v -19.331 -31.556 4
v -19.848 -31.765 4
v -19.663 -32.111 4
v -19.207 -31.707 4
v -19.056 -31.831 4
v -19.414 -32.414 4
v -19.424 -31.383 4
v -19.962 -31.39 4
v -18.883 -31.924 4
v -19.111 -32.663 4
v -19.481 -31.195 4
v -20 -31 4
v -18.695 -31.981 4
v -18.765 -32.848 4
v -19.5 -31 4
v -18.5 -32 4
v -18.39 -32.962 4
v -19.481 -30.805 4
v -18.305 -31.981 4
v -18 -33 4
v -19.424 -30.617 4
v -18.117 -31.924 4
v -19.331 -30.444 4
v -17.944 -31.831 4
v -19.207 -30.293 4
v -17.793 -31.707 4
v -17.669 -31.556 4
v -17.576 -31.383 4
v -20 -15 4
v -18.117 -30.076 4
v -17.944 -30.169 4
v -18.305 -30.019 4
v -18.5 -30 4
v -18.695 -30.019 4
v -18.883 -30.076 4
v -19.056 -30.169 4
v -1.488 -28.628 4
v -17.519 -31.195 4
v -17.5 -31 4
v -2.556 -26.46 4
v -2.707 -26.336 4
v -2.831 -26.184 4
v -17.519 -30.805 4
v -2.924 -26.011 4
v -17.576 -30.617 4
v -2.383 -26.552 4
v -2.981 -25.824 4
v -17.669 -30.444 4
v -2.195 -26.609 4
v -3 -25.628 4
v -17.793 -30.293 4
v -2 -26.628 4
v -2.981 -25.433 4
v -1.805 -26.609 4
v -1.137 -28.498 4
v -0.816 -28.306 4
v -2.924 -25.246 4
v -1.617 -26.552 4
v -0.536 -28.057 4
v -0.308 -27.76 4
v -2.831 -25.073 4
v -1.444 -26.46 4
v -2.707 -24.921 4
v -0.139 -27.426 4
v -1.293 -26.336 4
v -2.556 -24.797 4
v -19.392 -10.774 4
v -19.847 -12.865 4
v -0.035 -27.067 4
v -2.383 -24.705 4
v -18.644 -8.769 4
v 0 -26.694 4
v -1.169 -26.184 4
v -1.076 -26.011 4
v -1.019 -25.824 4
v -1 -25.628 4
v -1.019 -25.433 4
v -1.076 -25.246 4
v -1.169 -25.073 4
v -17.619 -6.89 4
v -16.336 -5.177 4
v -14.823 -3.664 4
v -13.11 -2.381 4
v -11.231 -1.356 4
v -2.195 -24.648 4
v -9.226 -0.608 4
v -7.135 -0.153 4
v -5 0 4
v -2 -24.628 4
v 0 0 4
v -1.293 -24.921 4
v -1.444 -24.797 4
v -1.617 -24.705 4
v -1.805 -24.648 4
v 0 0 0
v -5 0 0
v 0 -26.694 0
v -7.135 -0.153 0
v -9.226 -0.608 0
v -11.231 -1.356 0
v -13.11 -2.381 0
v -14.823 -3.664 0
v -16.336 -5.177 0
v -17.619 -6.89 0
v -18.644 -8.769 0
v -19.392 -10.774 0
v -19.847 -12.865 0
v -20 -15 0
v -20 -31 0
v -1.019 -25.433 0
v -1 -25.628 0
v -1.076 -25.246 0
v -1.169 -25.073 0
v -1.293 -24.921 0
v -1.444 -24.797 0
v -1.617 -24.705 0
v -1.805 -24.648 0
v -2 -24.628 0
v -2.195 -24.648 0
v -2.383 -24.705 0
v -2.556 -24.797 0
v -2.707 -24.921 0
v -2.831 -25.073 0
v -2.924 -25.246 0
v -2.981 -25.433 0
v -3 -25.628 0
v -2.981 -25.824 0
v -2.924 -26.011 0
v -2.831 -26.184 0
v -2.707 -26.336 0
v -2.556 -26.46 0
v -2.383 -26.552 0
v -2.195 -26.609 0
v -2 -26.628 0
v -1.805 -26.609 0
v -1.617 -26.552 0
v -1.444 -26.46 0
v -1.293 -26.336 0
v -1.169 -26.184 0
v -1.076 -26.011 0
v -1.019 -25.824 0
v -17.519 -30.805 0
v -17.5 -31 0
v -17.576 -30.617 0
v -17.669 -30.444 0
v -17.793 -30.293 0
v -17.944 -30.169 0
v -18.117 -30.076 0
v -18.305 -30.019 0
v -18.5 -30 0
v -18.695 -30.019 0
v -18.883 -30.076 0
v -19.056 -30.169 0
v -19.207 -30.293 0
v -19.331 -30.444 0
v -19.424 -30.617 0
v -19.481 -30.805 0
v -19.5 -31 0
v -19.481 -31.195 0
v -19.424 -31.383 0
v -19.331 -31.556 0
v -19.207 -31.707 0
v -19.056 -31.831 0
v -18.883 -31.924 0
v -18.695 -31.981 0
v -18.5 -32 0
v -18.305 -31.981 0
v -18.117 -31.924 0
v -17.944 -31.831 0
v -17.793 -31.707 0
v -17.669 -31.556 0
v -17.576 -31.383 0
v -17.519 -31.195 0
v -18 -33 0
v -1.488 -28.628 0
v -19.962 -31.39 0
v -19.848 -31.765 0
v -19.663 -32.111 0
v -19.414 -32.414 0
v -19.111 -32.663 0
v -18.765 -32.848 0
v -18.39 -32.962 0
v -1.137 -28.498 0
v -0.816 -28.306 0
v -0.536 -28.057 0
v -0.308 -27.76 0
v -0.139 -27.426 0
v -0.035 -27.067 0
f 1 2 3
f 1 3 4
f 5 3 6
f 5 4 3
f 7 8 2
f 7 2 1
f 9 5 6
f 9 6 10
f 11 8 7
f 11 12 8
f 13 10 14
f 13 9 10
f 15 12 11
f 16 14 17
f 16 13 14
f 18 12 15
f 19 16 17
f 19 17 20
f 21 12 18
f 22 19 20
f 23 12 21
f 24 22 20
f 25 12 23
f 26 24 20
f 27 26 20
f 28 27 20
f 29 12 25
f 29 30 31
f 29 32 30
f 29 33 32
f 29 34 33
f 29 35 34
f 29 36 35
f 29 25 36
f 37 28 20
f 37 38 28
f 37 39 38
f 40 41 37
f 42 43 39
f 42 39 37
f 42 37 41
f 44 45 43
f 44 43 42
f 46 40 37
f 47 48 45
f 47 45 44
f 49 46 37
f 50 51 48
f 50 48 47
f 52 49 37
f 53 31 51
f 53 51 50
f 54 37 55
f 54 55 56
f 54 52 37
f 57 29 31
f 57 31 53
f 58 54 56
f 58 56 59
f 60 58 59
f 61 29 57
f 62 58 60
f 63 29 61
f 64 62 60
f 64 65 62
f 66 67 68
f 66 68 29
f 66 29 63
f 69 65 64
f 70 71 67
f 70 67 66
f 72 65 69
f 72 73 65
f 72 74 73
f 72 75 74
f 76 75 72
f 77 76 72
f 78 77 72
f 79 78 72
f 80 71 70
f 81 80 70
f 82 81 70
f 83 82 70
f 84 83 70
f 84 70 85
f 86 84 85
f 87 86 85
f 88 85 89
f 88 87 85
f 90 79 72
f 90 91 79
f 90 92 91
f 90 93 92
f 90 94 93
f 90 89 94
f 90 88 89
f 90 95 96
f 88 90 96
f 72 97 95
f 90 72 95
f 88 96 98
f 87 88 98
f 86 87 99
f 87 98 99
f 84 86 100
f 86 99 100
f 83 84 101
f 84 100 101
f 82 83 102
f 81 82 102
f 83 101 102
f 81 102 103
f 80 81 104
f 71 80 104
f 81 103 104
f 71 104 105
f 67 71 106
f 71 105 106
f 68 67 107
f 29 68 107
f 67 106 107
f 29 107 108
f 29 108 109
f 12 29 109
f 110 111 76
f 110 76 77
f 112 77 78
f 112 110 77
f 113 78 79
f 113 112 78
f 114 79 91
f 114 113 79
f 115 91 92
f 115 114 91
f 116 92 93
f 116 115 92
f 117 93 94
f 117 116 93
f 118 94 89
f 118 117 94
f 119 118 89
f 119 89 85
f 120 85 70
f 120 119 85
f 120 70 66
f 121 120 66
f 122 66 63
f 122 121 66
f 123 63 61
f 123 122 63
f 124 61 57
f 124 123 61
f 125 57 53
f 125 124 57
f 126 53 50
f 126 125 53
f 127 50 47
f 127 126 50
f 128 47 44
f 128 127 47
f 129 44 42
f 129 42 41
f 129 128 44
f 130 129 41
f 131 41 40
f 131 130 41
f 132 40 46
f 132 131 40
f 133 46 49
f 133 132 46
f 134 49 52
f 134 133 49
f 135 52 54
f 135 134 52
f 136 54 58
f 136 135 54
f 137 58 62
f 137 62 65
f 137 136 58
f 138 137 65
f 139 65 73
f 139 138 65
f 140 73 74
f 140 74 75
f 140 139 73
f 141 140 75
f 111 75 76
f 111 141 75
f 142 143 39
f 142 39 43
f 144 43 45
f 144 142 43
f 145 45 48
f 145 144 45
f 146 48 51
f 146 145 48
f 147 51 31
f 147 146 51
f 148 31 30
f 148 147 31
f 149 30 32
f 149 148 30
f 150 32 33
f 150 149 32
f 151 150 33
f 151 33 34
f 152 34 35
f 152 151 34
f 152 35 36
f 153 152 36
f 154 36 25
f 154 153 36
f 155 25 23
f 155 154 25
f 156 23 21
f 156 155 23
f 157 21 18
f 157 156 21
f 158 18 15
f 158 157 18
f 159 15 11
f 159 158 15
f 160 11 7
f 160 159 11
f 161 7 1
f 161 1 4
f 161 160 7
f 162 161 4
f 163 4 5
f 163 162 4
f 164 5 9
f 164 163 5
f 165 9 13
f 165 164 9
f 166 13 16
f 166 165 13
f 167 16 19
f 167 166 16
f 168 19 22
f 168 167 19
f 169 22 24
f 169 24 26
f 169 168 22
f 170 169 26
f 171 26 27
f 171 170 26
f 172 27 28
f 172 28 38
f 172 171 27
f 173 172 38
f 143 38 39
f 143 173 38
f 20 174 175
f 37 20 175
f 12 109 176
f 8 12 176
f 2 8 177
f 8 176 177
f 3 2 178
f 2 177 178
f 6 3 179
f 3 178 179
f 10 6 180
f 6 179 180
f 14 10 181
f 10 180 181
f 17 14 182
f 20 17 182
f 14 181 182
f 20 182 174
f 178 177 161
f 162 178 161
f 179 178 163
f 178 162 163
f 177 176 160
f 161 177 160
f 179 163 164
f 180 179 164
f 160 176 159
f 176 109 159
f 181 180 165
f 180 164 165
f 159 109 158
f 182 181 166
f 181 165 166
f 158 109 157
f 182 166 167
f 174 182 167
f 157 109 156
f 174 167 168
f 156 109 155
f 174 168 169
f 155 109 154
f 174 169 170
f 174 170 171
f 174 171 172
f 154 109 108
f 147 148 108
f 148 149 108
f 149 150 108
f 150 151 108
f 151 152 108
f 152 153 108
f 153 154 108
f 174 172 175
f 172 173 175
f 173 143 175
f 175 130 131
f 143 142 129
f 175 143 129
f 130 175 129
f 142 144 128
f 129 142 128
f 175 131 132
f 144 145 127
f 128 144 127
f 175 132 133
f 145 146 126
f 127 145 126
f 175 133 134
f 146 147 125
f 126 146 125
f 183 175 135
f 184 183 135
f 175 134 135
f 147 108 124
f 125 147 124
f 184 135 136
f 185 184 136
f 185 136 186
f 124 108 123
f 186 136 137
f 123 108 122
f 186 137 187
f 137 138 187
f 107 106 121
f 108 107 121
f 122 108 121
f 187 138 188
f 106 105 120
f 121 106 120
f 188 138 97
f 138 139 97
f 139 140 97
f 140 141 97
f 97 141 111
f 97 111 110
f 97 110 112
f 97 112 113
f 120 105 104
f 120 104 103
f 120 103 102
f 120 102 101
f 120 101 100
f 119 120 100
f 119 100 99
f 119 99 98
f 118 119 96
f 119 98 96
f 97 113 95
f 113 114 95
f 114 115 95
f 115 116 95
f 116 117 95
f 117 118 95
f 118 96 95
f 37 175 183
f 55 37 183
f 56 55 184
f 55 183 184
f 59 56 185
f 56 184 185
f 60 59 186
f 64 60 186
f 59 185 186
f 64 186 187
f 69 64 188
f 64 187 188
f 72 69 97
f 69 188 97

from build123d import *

# Parameters (mm, degrees)
SKETCH1_R           = 1
BOSS_EXTRUDE1_DEPTH = 4


with BuildPart() as part:
    # Sketch1 → Boss-Extrude1 (new body)
    with BuildSketch(Plane.XY):
        with BuildLine():
            Line((0, 0), (-5, 0))
            ThreePointArc((-5, 0), (-15.606601718, -4.393398282), (-20, -15))
            Line((-20, -15), (-20, -31))
            ThreePointArc((-20, -31), (-19.414213562, -32.414213562), (-18, -33))
            Line((-18, -33), (-1.488039242, -28.627581694))
            ThreePointArc((-1.488039242, -28.627581694), (-0.415083359, -27.914069878), (0, -26.694217739))
            Line((0, -26.694217739), (0, 0))
        make_face()
        with Locations((-18.5, -31)):
            Circle(SKETCH1_R, mode=Mode.SUBTRACT)
        with Locations((-2, -25.628432728)):
            Circle(SKETCH1_R, mode=Mode.SUBTRACT)
    extrude(amount=BOSS_EXTRUDE1_DEPTH)


solid = part.part
